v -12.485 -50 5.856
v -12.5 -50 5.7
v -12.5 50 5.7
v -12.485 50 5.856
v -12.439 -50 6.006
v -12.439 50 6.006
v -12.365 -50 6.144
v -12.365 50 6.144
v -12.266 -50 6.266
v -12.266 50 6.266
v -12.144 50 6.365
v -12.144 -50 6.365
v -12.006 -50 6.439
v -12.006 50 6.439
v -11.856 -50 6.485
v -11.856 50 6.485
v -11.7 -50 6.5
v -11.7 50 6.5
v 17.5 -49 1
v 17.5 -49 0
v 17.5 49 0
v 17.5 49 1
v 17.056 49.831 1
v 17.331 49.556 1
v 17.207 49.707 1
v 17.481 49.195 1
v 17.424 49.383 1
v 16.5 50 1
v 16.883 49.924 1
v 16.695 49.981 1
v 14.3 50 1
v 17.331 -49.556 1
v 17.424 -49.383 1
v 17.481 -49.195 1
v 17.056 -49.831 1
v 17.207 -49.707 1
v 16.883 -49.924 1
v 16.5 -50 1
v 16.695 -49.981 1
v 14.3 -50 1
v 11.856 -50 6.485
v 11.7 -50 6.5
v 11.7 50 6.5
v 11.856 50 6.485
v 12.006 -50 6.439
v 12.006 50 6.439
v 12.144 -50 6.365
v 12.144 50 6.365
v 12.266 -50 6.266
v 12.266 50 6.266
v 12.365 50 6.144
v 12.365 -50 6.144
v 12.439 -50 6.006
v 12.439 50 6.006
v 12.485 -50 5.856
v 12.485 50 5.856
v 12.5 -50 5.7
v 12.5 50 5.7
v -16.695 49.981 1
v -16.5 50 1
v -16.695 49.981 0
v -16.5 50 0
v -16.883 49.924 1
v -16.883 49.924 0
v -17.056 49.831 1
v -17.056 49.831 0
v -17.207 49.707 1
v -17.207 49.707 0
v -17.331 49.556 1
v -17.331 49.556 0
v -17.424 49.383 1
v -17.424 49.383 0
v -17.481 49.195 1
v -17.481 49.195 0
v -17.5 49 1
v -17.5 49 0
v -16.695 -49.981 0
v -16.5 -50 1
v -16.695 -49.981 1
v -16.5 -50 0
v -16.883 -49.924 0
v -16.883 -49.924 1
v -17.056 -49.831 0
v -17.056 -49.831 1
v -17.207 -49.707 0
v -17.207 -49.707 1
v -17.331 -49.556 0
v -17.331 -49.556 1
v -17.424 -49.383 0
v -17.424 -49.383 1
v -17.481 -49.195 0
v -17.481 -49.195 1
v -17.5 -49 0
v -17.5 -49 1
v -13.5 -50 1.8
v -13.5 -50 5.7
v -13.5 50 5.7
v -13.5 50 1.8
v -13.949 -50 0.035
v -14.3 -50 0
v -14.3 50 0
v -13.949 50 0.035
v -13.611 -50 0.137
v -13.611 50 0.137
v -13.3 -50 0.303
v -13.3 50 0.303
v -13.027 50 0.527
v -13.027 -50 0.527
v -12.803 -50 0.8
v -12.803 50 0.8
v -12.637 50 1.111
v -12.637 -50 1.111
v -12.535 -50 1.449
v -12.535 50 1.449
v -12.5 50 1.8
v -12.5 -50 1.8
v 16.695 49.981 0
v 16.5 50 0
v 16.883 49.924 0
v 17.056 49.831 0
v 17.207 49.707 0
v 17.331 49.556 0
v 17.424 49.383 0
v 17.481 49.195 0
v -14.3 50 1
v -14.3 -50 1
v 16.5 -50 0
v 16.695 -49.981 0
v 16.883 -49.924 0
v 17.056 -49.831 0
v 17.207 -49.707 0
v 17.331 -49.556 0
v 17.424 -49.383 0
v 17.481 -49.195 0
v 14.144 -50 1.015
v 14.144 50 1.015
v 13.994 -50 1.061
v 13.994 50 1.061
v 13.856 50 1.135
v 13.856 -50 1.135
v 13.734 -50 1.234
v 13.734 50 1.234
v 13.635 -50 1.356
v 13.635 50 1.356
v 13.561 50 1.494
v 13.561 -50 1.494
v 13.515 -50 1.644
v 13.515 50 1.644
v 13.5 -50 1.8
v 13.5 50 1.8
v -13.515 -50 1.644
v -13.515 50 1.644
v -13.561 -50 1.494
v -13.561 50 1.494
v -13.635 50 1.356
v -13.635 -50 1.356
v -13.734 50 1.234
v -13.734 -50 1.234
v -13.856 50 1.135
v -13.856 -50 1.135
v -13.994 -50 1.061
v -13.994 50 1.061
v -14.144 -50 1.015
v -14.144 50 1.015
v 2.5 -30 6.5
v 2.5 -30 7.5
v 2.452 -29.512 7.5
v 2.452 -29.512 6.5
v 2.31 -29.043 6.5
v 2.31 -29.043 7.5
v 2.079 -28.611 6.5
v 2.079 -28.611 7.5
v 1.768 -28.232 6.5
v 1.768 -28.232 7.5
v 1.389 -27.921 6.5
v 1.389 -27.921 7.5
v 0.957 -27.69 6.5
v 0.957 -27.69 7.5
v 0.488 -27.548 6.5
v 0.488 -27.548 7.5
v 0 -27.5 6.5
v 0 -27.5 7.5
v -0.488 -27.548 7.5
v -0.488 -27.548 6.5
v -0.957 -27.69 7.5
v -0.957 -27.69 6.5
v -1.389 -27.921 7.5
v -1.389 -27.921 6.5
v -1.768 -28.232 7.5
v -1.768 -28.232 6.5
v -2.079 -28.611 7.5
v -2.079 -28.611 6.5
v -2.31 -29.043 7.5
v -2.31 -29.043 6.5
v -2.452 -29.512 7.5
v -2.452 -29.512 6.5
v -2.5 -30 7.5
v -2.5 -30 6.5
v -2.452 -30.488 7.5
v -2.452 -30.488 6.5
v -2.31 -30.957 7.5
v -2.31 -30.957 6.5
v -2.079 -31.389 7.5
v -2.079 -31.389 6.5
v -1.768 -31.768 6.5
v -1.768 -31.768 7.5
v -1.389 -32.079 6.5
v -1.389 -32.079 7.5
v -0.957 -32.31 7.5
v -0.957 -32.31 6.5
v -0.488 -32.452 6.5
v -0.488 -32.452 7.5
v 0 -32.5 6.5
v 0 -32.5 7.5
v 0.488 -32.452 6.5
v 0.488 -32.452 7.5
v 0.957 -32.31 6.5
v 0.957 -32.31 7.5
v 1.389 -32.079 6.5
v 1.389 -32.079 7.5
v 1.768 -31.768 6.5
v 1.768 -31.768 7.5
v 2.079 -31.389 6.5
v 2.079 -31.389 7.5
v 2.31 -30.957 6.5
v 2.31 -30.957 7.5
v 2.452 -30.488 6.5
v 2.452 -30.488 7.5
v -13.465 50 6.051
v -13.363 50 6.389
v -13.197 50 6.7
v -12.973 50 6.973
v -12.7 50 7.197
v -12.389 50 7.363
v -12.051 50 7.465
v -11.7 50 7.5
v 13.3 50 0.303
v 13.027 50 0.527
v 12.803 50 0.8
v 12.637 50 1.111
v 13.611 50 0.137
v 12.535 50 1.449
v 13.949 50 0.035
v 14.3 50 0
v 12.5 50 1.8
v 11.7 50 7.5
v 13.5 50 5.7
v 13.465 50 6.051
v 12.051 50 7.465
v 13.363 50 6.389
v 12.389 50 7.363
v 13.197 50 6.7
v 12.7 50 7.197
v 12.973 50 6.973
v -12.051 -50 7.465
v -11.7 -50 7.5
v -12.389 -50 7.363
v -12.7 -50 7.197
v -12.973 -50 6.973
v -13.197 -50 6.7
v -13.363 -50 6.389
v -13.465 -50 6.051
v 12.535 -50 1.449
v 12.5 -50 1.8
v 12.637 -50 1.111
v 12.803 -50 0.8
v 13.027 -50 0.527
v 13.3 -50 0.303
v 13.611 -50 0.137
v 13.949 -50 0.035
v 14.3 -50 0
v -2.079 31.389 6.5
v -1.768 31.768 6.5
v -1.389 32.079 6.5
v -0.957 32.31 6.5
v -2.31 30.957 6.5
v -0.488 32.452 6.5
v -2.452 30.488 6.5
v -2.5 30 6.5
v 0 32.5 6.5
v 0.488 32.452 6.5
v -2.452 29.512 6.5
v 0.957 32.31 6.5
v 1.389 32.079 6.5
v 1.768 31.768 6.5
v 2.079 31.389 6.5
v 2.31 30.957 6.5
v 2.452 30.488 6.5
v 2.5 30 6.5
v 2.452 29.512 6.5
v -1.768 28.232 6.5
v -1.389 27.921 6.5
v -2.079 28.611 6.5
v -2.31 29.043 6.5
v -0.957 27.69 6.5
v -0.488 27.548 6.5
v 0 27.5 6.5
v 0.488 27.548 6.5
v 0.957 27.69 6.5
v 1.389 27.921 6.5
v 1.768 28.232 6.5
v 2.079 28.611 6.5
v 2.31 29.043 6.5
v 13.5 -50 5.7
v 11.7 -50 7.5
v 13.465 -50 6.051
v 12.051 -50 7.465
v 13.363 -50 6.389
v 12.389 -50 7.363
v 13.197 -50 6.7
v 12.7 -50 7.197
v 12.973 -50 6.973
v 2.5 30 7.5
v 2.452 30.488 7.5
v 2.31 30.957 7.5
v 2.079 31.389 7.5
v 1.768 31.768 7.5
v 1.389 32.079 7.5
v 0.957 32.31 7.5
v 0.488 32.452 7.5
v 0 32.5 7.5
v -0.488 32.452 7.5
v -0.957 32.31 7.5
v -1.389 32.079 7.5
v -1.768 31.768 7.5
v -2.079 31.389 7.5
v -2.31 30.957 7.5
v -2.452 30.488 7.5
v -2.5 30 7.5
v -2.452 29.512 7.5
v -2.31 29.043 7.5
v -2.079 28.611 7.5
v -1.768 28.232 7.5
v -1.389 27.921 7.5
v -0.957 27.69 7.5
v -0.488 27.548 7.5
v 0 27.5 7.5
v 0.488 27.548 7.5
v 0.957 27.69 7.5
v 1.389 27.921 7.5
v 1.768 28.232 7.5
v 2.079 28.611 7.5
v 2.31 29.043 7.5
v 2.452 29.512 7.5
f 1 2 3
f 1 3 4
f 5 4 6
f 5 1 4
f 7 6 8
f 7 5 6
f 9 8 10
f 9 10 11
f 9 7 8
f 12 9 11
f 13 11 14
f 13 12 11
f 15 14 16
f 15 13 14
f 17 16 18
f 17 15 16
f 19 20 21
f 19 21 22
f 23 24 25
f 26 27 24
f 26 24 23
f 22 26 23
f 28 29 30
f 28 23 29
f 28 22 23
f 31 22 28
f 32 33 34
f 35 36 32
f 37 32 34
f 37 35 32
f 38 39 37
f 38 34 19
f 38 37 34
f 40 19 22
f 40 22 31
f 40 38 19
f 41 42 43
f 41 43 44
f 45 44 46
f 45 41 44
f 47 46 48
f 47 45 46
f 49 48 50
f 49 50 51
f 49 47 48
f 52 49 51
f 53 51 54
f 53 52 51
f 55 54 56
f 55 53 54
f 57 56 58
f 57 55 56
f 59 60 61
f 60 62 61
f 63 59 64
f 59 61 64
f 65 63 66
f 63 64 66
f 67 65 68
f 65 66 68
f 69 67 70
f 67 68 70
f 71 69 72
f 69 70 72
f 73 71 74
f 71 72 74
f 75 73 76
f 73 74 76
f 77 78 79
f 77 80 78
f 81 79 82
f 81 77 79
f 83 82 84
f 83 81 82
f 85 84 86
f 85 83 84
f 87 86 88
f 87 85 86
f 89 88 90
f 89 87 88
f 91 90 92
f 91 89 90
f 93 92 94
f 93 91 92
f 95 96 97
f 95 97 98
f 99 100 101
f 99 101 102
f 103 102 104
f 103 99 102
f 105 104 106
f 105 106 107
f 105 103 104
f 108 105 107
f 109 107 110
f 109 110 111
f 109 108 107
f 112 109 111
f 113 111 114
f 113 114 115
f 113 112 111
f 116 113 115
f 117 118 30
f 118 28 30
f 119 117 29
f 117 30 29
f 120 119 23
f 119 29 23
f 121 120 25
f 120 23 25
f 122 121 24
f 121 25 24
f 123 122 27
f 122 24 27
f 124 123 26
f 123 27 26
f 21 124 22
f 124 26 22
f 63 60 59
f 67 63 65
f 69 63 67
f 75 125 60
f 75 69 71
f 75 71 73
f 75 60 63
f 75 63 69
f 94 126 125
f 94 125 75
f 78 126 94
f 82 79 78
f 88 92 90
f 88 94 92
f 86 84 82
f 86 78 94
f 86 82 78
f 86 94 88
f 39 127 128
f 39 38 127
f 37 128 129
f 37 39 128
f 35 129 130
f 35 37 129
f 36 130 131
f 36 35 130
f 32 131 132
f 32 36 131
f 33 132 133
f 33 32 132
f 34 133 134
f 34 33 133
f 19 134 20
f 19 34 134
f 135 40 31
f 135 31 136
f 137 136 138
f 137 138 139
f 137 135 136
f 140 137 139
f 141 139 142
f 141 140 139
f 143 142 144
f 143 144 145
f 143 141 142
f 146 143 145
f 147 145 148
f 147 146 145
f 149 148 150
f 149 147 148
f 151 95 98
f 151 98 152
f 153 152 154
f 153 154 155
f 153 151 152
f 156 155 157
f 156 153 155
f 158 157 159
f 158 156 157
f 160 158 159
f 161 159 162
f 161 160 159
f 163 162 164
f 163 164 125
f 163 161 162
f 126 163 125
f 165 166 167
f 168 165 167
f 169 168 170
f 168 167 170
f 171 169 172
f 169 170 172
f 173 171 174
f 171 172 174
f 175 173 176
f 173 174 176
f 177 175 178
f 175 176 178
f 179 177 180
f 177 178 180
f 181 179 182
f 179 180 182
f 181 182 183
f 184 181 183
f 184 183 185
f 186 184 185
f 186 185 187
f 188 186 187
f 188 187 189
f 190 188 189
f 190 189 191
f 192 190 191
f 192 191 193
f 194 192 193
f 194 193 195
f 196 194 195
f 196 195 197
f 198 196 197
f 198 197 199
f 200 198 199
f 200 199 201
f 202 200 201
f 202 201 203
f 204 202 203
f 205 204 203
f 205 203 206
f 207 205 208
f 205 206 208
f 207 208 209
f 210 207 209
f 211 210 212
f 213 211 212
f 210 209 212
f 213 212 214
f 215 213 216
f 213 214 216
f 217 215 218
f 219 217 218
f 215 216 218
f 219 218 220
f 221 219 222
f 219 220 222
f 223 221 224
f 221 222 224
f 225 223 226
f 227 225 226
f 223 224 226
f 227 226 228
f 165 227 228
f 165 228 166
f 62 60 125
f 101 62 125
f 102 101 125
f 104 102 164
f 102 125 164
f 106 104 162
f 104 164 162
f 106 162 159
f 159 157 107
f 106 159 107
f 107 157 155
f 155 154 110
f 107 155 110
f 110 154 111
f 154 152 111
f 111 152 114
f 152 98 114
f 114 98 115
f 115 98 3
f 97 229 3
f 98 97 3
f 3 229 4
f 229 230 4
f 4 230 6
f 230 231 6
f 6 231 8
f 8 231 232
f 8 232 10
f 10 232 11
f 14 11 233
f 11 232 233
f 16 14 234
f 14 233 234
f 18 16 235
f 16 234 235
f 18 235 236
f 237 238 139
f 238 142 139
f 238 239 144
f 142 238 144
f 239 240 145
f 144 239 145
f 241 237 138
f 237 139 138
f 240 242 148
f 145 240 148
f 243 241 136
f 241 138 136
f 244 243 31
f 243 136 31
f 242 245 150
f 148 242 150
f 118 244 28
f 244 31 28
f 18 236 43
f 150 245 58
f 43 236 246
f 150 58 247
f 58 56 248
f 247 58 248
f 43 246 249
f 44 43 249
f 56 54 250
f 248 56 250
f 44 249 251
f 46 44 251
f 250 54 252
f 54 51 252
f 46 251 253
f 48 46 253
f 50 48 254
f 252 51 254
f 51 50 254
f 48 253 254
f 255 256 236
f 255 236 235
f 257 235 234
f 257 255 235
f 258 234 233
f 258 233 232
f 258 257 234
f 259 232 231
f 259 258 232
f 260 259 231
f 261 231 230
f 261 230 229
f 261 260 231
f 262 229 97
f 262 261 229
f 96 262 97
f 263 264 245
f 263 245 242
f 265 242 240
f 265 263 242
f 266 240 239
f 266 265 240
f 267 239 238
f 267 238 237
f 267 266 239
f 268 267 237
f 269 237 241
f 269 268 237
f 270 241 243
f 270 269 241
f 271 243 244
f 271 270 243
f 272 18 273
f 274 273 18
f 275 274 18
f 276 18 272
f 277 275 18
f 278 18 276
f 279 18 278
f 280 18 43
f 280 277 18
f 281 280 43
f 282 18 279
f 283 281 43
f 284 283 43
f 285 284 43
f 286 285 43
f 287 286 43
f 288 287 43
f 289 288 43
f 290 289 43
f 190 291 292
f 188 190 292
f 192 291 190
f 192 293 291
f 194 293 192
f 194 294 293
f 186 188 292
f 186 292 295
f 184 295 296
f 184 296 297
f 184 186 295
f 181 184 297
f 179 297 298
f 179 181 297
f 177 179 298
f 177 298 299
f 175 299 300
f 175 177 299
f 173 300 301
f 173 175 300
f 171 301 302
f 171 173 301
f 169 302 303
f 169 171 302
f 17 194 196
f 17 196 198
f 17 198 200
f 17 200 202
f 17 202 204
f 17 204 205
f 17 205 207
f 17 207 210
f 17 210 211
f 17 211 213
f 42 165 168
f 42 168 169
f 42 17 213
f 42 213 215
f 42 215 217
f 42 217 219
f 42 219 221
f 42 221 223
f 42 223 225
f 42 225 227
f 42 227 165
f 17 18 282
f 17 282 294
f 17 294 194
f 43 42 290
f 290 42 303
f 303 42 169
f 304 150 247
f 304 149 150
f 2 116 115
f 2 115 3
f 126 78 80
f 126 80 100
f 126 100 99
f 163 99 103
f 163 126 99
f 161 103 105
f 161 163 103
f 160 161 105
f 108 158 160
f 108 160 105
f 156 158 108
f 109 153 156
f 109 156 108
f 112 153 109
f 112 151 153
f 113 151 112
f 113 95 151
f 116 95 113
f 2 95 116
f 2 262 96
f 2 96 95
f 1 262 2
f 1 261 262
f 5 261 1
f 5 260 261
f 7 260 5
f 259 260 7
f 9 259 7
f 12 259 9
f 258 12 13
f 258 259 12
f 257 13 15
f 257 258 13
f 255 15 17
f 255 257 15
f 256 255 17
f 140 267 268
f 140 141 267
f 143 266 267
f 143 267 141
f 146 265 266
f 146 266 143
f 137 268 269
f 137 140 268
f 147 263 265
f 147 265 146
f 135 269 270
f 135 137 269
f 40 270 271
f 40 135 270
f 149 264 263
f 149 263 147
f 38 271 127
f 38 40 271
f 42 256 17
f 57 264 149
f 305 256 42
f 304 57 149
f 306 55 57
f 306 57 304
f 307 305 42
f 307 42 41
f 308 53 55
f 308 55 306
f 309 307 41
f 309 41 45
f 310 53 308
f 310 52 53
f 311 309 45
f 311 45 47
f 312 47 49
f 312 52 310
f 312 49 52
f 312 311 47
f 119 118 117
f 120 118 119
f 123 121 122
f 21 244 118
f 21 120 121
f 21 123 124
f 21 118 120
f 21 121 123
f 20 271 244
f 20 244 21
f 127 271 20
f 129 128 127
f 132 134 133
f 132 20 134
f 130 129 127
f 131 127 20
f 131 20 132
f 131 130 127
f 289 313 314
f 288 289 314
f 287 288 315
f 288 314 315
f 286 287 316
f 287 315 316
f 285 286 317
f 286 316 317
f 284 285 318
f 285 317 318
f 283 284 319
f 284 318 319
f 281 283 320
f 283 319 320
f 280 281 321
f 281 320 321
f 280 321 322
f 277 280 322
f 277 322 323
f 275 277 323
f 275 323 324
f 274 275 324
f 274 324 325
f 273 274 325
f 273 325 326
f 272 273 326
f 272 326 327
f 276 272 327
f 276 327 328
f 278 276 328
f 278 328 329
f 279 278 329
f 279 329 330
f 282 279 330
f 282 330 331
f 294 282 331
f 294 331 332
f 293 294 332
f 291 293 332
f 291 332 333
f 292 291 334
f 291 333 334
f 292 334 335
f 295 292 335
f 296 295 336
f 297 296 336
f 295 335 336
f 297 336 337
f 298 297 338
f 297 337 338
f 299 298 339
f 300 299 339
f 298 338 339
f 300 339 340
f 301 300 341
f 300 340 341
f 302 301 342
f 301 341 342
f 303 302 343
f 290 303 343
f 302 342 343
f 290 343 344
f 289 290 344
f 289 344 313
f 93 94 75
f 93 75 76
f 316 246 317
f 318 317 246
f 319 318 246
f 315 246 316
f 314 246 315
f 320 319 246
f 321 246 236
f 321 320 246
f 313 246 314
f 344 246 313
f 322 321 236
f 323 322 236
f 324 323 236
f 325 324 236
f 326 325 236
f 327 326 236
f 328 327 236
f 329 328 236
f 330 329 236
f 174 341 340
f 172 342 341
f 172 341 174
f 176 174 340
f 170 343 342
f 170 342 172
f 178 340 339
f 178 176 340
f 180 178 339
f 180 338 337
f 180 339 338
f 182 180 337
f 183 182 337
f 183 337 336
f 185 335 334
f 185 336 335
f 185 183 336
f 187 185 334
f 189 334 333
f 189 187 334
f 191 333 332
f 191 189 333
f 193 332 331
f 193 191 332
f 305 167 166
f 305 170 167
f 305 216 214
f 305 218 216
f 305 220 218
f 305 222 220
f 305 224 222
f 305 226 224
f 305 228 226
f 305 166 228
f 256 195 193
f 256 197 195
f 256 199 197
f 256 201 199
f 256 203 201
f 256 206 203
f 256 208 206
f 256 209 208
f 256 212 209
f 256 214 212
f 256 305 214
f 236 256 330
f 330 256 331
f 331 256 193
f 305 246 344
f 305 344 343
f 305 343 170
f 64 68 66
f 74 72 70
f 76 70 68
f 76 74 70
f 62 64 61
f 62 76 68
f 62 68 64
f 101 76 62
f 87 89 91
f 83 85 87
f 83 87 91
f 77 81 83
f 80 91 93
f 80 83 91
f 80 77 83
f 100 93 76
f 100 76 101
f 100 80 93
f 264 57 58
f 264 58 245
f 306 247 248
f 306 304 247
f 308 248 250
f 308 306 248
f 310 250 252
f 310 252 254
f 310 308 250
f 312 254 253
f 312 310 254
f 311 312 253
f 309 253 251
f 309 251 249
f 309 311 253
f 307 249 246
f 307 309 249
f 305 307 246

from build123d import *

# Parameters (mm, degrees)
F1_DEPTH = 50
F2_R     = 2.5
F3_DEPTH = 25
F4_R     = 1


with BuildPart() as f1:
    # F0 (on Front) → F1 (new body, symmetric)
    with BuildSketch(Plane.XZ):
        with BuildLine():
            Line((11.7, 7.5), (0, 7.5))
            Line((0, 7.5), (-11.7, 7.5))
            ThreePointArc((-11.7, 7.5), (-12.972792, 6.972792), (-13.5, 5.7))
            Line((-13.5, 5.7), (-13.5, 1.8))
            ThreePointArc((-13.5, 1.8), (-13.734315, 1.234315), (-14.3, 1))
            Line((-14.3, 1), (-17.5, 1))
            Line((-17.5, 1), (-17.5, 0))
            Line((-17.5, 0), (-14.3, 0))
            ThreePointArc((-14.3, 0), (-13.027208, 0.527208), (-12.5, 1.8))
            Line((-12.5, 1.8), (-12.5, 5.7))
            ThreePointArc((-12.5, 5.7), (-12.265685, 6.265685), (-11.7, 6.5))
            Line((-11.7, 6.5), (0, 6.5))
            Line((0, 6.5), (11.7, 6.5))
            ThreePointArc((11.7, 6.5), (12.265685, 6.265685), (12.5, 5.7))
            Line((12.5, 5.7), (12.5, 1.8))
            ThreePointArc((12.5, 1.8), (13.027208, 0.527208), (14.3, 0))
            Line((14.3, 0), (17.5, 0))
            Line((17.5, 0), (17.5, 1))
            Line((17.5, 1), (14.3, 1))
            ThreePointArc((14.3, 1), (13.734315, 1.234315), (13.5, 1.8))
            Line((13.5, 1.8), (13.5, 5.7))
            ThreePointArc((13.5, 5.7), (12.972792, 6.972792), (11.7, 7.5))
        make_face()
    extrude(amount=F1_DEPTH, both=True)

    # F2 (on face) → F3 (cut)
    with BuildSketch(Plane.XY.offset(7.5)):
        with Locations((0, 30)):
            Circle(F2_R)
        with Locations((0, -30)):
            Circle(F2_R)
    extrude(amount=-F3_DEPTH, mode=Mode.SUBTRACT)

    # F4
    f4_edges = [f1.edges().sort_by_distance(p)[0] for p in [
        (17.5, 50, 0.5),
        (-17.5, 50, 0.5),
        (17.5, -50, 0.5),
        (-17.5, -50, 0.5),
    ]]
    fillet(f4_edges, radius=F4_R)


solid = f1.part
